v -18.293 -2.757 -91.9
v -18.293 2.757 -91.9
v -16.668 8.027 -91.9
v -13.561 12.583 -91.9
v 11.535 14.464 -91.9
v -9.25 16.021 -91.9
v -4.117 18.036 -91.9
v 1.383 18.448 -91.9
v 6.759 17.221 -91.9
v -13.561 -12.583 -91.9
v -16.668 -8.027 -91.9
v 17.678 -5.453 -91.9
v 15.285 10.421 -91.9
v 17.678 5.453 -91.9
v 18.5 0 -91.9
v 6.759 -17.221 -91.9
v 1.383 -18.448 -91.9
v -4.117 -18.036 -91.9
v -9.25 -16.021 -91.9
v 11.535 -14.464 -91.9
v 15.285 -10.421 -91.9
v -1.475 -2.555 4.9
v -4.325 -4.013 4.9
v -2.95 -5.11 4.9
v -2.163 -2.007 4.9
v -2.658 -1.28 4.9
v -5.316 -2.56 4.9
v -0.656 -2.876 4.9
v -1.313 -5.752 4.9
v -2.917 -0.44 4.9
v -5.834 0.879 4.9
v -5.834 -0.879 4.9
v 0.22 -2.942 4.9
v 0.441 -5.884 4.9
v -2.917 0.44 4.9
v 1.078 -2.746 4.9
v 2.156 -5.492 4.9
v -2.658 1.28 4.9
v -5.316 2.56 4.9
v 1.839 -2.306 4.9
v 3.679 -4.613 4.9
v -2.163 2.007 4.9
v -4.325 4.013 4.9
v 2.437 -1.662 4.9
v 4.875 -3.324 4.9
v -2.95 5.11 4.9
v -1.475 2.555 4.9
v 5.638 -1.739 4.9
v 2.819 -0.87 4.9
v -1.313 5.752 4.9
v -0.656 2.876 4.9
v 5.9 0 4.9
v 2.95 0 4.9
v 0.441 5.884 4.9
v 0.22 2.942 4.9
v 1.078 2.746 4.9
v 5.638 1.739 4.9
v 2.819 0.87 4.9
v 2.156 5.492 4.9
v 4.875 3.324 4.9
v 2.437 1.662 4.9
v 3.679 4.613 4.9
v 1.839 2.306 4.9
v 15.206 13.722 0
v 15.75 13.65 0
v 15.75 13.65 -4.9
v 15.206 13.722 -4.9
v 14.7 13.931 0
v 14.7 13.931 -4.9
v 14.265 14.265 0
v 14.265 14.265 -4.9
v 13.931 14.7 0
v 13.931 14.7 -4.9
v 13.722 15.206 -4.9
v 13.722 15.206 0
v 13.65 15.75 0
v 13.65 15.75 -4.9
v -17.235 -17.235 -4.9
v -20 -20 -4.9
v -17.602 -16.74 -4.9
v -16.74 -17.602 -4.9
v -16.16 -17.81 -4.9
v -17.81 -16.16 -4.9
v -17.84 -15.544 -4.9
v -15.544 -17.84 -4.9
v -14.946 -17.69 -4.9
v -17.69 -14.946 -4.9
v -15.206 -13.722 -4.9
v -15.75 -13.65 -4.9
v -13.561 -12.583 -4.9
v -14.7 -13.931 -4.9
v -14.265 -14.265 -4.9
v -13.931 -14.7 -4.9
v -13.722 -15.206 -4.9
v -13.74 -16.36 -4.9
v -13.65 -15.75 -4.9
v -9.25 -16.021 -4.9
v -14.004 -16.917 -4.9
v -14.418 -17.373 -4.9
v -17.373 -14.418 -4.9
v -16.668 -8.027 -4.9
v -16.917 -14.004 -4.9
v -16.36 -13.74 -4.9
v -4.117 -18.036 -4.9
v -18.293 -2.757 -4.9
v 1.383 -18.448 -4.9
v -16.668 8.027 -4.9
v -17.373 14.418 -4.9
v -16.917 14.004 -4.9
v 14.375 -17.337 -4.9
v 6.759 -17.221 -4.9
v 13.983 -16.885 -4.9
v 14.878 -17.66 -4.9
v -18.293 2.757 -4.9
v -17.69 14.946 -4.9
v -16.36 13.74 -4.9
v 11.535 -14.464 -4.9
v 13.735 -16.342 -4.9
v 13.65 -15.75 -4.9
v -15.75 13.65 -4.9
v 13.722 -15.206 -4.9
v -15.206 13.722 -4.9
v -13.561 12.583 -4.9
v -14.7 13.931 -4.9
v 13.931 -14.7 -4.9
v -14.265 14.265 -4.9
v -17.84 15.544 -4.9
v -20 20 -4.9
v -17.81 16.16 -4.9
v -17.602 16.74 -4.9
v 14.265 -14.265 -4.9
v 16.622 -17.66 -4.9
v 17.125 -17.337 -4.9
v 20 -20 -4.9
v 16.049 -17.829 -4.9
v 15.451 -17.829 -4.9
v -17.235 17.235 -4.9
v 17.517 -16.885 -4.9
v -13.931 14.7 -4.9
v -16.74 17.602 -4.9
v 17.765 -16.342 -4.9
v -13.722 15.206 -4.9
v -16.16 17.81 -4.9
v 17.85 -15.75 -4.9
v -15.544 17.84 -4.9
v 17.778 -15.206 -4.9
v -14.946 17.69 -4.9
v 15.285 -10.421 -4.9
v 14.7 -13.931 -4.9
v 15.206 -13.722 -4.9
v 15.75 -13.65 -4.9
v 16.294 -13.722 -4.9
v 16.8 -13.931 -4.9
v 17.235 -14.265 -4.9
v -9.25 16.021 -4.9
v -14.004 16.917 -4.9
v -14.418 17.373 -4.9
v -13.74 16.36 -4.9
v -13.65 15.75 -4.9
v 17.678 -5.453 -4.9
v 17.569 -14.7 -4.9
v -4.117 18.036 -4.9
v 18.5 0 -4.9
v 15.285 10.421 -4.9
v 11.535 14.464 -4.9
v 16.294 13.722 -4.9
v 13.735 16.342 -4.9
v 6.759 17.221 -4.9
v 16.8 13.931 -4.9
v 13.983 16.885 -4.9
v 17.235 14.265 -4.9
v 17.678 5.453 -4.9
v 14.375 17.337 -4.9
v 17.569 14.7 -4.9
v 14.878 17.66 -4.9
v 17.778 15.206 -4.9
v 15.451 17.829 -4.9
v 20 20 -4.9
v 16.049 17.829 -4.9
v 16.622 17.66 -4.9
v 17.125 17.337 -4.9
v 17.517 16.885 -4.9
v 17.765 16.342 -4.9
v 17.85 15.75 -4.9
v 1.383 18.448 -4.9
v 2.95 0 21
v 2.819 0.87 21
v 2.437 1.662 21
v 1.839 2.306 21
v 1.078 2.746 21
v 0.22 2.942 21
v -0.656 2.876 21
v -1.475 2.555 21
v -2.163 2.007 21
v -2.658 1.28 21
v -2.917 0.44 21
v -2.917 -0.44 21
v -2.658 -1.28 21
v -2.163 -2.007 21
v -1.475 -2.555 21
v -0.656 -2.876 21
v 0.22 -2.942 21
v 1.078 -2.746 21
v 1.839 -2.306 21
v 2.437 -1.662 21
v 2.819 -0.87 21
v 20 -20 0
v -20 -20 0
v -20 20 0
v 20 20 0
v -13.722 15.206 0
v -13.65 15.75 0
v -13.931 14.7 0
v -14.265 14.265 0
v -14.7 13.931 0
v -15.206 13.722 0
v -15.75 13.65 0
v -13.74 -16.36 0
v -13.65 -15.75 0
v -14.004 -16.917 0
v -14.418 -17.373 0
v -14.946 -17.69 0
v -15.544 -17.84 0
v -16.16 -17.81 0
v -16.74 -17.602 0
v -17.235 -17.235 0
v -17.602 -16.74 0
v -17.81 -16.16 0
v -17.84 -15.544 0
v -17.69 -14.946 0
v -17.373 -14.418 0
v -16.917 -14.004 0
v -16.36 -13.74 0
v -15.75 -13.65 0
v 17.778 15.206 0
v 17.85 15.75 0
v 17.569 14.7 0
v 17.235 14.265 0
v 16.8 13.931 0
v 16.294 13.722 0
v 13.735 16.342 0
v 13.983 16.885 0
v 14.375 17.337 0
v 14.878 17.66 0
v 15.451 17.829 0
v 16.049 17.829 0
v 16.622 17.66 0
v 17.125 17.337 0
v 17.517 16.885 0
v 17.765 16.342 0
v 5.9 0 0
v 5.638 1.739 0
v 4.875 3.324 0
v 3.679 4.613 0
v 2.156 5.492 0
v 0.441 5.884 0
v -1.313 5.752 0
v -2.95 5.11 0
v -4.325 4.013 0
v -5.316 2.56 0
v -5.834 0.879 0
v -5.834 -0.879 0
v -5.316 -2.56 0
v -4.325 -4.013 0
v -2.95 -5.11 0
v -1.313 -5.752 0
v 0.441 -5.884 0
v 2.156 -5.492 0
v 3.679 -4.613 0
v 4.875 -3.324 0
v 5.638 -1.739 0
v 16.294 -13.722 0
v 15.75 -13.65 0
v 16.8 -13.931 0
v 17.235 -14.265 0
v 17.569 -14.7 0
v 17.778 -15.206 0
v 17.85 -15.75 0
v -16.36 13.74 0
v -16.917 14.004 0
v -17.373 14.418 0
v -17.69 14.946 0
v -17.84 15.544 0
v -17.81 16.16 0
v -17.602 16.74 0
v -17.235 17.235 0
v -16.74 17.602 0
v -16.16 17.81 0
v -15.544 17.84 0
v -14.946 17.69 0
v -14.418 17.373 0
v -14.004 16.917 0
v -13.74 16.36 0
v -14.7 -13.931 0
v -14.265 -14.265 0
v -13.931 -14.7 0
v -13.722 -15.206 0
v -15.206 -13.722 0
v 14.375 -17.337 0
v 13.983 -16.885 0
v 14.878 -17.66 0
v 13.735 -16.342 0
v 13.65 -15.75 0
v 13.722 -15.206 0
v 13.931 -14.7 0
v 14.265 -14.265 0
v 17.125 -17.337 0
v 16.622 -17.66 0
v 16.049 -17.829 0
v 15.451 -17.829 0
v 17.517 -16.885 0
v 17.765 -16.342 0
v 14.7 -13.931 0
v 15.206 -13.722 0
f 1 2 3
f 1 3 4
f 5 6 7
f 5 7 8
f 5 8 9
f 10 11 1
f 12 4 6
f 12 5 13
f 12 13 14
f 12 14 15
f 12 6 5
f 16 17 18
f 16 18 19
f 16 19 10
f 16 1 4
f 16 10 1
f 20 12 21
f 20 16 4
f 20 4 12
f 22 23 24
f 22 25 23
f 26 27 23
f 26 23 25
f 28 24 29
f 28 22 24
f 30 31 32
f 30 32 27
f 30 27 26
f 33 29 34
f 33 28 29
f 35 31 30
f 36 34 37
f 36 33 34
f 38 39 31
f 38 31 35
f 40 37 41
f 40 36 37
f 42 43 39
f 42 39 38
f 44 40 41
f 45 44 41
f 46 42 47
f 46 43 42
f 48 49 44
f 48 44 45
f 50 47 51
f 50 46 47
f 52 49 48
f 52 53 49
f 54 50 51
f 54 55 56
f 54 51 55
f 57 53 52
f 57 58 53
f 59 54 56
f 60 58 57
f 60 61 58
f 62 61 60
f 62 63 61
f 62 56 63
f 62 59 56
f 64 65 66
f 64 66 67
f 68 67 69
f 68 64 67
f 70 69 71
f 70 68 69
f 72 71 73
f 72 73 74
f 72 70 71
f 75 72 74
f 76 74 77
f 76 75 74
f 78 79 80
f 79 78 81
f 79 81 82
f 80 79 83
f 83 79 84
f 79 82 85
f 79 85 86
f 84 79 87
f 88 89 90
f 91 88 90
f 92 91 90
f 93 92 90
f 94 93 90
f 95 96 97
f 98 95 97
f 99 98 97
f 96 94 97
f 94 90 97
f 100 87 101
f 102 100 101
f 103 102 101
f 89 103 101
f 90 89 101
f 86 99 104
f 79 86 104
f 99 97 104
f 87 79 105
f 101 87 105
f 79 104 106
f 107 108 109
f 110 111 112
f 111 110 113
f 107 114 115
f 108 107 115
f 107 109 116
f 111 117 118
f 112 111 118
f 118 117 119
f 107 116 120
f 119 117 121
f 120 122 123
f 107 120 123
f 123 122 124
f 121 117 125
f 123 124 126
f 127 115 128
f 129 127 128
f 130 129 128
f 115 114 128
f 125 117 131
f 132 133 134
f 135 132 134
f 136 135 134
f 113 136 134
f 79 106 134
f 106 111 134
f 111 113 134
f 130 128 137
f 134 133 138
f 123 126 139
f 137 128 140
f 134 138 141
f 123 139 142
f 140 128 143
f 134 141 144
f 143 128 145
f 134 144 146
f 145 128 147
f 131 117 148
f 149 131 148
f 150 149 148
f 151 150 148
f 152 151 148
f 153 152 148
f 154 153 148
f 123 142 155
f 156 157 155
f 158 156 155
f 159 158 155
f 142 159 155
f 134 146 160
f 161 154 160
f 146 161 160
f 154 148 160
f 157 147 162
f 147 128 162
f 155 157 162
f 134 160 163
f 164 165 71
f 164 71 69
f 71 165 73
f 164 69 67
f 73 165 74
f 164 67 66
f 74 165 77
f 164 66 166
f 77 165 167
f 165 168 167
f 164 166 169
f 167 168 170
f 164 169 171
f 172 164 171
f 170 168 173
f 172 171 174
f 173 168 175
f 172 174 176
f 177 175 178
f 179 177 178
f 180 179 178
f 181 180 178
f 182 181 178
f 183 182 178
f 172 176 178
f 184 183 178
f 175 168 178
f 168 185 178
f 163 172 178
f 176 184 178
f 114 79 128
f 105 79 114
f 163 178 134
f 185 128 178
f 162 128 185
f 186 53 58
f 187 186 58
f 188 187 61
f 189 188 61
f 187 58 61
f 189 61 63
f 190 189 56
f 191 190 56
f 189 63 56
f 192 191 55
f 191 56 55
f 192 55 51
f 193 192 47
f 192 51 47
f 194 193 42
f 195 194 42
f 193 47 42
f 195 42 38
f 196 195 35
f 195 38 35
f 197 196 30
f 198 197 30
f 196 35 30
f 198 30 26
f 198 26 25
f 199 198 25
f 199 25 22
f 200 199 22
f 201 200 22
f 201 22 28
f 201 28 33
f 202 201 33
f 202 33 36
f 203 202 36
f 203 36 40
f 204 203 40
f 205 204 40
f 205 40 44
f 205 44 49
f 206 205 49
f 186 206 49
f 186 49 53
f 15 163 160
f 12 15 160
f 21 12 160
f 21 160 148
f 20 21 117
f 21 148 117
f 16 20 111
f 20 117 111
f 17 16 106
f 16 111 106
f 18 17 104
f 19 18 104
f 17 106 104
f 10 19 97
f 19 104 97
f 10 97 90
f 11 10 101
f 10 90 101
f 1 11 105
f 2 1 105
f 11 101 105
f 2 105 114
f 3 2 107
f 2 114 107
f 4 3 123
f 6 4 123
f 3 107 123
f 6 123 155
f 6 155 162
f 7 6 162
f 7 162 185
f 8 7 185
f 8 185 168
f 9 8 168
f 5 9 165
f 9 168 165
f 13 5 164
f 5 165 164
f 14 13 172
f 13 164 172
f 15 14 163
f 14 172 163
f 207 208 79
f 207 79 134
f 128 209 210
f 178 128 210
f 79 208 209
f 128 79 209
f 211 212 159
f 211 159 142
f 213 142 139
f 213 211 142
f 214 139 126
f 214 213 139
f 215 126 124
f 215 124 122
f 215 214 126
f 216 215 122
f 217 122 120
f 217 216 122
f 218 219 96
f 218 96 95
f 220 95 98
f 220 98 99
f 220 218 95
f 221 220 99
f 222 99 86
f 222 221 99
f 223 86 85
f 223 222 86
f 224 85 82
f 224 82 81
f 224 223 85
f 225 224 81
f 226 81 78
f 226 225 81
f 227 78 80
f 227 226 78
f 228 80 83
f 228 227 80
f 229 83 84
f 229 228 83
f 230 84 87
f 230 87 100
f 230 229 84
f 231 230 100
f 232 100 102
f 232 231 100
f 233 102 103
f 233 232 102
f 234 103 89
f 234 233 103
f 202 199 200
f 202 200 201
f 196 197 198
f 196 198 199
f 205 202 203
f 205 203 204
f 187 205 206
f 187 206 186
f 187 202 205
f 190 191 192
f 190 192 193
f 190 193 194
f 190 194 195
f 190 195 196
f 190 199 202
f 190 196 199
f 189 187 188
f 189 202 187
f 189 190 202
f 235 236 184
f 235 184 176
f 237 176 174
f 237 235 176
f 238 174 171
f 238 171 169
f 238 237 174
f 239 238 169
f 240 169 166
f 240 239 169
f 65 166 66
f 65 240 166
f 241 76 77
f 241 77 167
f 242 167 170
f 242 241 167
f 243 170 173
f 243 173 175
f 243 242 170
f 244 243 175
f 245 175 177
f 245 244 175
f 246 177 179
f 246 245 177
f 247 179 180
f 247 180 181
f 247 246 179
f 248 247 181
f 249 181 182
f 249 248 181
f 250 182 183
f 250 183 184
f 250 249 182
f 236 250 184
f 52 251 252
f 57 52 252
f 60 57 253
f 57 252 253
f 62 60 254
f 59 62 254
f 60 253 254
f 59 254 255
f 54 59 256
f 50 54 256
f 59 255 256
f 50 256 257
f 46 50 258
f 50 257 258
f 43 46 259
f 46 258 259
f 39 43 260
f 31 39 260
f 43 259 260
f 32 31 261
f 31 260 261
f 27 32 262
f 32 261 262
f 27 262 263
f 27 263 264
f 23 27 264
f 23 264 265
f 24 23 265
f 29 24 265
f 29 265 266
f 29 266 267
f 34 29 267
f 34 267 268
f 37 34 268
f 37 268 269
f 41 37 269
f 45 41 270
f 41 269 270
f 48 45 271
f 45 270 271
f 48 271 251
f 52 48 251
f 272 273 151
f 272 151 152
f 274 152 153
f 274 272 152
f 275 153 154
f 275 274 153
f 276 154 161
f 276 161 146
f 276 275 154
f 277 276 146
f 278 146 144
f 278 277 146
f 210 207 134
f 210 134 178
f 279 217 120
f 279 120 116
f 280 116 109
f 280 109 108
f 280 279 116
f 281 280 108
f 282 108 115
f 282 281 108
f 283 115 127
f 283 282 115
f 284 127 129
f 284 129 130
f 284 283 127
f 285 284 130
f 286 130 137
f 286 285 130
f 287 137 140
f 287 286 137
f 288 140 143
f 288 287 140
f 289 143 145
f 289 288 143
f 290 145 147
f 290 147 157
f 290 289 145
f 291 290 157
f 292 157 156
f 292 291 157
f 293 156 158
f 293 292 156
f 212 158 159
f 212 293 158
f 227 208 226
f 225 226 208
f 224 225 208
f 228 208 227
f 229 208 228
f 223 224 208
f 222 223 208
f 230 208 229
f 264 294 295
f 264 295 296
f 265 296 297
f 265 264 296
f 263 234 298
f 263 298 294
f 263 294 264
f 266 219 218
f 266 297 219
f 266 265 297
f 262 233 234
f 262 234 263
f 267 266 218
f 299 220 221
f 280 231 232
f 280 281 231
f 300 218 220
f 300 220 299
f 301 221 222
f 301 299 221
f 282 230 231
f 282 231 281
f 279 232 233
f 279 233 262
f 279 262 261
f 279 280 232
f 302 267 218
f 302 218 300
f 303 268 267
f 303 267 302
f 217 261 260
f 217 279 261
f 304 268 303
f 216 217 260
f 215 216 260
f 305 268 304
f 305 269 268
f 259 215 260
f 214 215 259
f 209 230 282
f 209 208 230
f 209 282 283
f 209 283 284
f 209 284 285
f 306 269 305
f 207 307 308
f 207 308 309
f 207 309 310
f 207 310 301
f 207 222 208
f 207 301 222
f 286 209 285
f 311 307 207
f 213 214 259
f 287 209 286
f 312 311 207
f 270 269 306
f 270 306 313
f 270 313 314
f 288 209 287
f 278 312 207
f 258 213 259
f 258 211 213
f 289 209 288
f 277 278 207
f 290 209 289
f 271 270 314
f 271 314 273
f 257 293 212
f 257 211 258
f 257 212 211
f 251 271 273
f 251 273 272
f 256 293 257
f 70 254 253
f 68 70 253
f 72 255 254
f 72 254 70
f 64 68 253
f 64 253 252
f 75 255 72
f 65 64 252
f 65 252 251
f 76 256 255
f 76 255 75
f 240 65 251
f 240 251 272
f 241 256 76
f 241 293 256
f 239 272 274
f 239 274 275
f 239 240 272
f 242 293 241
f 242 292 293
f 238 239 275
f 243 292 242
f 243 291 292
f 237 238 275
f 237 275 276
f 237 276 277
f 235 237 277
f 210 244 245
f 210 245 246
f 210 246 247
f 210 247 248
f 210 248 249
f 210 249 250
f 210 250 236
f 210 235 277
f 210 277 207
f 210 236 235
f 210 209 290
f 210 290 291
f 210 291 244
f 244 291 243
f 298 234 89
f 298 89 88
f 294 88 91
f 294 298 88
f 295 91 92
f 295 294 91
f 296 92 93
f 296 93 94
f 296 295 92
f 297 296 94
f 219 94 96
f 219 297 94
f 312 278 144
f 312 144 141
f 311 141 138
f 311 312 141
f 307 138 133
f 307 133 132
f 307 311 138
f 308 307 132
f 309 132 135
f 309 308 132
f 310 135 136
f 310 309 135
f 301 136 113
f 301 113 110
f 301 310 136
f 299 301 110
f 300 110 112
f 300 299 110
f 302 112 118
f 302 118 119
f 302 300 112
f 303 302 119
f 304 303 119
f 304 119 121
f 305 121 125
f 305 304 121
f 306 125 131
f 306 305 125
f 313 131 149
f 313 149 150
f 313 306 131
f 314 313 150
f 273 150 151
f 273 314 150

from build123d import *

# Parameters (mm, degrees)
F0_W     = 40
F0_H     = 40
F0_R     = 5.9
F0_R_2   = 2.95
F1_DEPTH = 4.9
F2_DEPTH = 21
F3_DEPTH = 4.9
F4_R     = 18.5
F5_DEPTH = 87


with BuildPart() as f1:
    # F0 (on Top) → F1 (new body)
    with BuildSketch(Plane.XY):
        Rectangle(F0_W, F0_H)
        with BuildLine():
            ThreePointArc((-15.75, 13.65), (-17.2349242405, 17.2349242405), (-13.65, 15.75))
            Line((-13.65, 15.75), (13.65, 15.75))
            ThreePointArc((13.65, 15.75), (15.75, 17.85), (17.85, 15.75))
            ThreePointArc((17.85, 15.75), (17.2349242405, 14.2650757595), (15.75, 13.65))
            Line((15.75, 13.65), (15.75, -13.65))
            ThreePointArc((15.75, -13.65), (17.2349242405, -14.2650757595), (17.85, -15.75))
            ThreePointArc((17.85, -15.75), (15.75, -17.85), (13.65, -15.75))
            Line((13.65, -15.75), (-13.65, -15.75))
            ThreePointArc((-13.65, -15.75), (-17.2349242405, -17.2349242405), (-15.75, -13.65))
            Line((-15.75, -13.65), (-15.75, 13.65))
        make_face(mode=Mode.SUBTRACT)
        with BuildLine():
            Line((13.65, 15.75), (-13.65, 15.75))
            ThreePointArc((-13.65, 15.75), (-14.2650757595, 14.2650757595), (-15.75, 13.65))
            Line((-15.75, 13.65), (-15.75, -13.65))
            ThreePointArc((-15.75, -13.65), (-14.2650757595, -14.2650757595), (-13.65, -15.75))
            Line((-13.65, -15.75), (13.65, -15.75))
            ThreePointArc((13.65, -15.75), (14.2650757595, -14.2650757595), (15.75, -13.65))
            Line((15.75, -13.65), (15.75, 13.65))
            ThreePointArc((15.75, 13.65), (14.2650757595, 14.2650757595), (13.65, 15.75))
        make_face()
        Circle(F0_R, mode=Mode.SUBTRACT)
        Circle(F0_R)
        Circle(F0_R_2, mode=Mode.SUBTRACT)
        Circle(F0_R_2)
    extrude(amount=-F1_DEPTH)

    # F0 (on Top) → F2 (join)
    with BuildSketch(Plane.XY):
        Circle(F0_R_2)
    extrude(amount=F2_DEPTH)

    # F0 (on Top) → F3 (join)
    with BuildSketch(Plane.XY):
        Circle(F0_R)
        Circle(F0_R_2, mode=Mode.SUBTRACT)
    extrude(amount=F3_DEPTH)

    # F4 (on face) → F5 (join)
    with BuildSketch(Plane(origin=(0, 0, -4.9), x_dir=(1, 0, 0), z_dir=(0, 0, -1))):
        Circle(F4_R)
    extrude(amount=F5_DEPTH)


solid = f1.part
